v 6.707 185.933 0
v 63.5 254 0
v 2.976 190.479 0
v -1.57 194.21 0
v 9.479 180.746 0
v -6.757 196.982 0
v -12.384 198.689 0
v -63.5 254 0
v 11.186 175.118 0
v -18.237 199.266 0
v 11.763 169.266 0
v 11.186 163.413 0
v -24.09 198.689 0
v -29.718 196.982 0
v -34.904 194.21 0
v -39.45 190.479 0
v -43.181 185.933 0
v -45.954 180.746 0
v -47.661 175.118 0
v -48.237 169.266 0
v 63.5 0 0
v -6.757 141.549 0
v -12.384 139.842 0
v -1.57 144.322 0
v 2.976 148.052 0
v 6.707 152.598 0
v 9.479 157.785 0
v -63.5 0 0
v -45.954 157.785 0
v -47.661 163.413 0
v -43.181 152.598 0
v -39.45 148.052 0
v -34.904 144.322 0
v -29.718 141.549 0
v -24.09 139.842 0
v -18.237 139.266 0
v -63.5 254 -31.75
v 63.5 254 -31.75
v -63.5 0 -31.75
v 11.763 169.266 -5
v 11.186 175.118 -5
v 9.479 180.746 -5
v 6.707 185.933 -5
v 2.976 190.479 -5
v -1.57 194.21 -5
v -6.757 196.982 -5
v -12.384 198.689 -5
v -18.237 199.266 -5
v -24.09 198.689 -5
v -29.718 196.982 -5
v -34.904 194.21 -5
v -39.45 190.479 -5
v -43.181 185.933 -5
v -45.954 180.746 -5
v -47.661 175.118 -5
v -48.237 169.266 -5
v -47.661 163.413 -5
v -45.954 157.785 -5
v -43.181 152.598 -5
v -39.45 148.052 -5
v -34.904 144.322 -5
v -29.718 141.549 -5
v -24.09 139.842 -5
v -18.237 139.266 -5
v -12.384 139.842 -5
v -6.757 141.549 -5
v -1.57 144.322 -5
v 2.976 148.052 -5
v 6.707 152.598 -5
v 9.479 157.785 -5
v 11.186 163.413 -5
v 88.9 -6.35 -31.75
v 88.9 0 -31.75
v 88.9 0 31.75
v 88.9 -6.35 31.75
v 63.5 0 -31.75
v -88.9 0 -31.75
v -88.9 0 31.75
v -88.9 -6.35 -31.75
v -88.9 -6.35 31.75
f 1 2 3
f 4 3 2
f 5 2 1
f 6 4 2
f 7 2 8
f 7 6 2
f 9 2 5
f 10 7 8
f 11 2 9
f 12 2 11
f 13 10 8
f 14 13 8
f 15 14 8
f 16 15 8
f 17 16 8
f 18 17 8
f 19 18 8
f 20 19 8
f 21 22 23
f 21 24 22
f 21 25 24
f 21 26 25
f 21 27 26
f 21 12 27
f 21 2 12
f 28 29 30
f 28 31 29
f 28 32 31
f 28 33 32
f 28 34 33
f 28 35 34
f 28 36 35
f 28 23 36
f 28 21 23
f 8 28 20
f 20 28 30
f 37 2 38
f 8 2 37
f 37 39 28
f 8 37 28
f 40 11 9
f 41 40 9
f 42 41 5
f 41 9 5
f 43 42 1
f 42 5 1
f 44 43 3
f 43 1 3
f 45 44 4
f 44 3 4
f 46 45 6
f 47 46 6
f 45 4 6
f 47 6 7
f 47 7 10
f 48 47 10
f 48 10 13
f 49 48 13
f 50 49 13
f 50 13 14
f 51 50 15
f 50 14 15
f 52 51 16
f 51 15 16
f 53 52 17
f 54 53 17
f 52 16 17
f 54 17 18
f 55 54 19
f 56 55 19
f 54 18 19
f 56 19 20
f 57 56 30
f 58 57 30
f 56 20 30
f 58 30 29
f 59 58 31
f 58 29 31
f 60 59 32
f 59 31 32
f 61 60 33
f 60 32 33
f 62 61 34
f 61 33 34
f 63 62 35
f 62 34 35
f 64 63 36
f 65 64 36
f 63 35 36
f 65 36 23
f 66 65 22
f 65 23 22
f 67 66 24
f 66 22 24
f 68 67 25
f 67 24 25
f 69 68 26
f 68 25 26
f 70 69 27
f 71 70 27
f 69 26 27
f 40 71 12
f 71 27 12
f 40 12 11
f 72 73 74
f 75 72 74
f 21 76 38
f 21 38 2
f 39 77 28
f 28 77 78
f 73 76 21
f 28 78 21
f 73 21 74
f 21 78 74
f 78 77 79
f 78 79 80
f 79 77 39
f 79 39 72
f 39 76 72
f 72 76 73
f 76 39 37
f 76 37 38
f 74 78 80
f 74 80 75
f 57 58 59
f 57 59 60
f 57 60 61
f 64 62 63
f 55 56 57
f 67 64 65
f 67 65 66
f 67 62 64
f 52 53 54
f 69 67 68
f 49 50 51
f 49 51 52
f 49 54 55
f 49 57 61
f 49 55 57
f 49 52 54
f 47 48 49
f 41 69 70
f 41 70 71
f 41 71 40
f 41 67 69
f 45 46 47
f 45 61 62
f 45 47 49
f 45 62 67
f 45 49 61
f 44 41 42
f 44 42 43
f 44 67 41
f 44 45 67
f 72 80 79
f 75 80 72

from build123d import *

# Parameters (mm, degrees)
F0_W     = 177.8
F0_H     = 63.5
F1_DEPTH = 6.35
F2_W     = 127
F2_H     = 31.75
F3_DEPTH = 254
F4_R     = 30
F5_DEPTH = 5


with BuildPart() as f1:
    # F0 (on Front) → F1 (new body)
    with BuildSketch(Plane.XZ):
        Rectangle(F0_W, F0_H)
    extrude(amount=F1_DEPTH)

    # F2 (on face) → F3 (join)
    with BuildSketch(Plane(origin=(0, 0, 0), x_dir=(-1, 0, 0), z_dir=(0, 1, 0))):
        with Locations((0, -15.875)):
            Rectangle(F2_W, F2_H)
    extrude(amount=F3_DEPTH)

    # F4 (on face) → F5 (cut)
    with BuildSketch(Plane.XY):
        with Locations((-18.2372, 169.2656)):
            Circle(F4_R)
    extrude(amount=-F5_DEPTH, mode=Mode.SUBTRACT)


solid = f1.part
